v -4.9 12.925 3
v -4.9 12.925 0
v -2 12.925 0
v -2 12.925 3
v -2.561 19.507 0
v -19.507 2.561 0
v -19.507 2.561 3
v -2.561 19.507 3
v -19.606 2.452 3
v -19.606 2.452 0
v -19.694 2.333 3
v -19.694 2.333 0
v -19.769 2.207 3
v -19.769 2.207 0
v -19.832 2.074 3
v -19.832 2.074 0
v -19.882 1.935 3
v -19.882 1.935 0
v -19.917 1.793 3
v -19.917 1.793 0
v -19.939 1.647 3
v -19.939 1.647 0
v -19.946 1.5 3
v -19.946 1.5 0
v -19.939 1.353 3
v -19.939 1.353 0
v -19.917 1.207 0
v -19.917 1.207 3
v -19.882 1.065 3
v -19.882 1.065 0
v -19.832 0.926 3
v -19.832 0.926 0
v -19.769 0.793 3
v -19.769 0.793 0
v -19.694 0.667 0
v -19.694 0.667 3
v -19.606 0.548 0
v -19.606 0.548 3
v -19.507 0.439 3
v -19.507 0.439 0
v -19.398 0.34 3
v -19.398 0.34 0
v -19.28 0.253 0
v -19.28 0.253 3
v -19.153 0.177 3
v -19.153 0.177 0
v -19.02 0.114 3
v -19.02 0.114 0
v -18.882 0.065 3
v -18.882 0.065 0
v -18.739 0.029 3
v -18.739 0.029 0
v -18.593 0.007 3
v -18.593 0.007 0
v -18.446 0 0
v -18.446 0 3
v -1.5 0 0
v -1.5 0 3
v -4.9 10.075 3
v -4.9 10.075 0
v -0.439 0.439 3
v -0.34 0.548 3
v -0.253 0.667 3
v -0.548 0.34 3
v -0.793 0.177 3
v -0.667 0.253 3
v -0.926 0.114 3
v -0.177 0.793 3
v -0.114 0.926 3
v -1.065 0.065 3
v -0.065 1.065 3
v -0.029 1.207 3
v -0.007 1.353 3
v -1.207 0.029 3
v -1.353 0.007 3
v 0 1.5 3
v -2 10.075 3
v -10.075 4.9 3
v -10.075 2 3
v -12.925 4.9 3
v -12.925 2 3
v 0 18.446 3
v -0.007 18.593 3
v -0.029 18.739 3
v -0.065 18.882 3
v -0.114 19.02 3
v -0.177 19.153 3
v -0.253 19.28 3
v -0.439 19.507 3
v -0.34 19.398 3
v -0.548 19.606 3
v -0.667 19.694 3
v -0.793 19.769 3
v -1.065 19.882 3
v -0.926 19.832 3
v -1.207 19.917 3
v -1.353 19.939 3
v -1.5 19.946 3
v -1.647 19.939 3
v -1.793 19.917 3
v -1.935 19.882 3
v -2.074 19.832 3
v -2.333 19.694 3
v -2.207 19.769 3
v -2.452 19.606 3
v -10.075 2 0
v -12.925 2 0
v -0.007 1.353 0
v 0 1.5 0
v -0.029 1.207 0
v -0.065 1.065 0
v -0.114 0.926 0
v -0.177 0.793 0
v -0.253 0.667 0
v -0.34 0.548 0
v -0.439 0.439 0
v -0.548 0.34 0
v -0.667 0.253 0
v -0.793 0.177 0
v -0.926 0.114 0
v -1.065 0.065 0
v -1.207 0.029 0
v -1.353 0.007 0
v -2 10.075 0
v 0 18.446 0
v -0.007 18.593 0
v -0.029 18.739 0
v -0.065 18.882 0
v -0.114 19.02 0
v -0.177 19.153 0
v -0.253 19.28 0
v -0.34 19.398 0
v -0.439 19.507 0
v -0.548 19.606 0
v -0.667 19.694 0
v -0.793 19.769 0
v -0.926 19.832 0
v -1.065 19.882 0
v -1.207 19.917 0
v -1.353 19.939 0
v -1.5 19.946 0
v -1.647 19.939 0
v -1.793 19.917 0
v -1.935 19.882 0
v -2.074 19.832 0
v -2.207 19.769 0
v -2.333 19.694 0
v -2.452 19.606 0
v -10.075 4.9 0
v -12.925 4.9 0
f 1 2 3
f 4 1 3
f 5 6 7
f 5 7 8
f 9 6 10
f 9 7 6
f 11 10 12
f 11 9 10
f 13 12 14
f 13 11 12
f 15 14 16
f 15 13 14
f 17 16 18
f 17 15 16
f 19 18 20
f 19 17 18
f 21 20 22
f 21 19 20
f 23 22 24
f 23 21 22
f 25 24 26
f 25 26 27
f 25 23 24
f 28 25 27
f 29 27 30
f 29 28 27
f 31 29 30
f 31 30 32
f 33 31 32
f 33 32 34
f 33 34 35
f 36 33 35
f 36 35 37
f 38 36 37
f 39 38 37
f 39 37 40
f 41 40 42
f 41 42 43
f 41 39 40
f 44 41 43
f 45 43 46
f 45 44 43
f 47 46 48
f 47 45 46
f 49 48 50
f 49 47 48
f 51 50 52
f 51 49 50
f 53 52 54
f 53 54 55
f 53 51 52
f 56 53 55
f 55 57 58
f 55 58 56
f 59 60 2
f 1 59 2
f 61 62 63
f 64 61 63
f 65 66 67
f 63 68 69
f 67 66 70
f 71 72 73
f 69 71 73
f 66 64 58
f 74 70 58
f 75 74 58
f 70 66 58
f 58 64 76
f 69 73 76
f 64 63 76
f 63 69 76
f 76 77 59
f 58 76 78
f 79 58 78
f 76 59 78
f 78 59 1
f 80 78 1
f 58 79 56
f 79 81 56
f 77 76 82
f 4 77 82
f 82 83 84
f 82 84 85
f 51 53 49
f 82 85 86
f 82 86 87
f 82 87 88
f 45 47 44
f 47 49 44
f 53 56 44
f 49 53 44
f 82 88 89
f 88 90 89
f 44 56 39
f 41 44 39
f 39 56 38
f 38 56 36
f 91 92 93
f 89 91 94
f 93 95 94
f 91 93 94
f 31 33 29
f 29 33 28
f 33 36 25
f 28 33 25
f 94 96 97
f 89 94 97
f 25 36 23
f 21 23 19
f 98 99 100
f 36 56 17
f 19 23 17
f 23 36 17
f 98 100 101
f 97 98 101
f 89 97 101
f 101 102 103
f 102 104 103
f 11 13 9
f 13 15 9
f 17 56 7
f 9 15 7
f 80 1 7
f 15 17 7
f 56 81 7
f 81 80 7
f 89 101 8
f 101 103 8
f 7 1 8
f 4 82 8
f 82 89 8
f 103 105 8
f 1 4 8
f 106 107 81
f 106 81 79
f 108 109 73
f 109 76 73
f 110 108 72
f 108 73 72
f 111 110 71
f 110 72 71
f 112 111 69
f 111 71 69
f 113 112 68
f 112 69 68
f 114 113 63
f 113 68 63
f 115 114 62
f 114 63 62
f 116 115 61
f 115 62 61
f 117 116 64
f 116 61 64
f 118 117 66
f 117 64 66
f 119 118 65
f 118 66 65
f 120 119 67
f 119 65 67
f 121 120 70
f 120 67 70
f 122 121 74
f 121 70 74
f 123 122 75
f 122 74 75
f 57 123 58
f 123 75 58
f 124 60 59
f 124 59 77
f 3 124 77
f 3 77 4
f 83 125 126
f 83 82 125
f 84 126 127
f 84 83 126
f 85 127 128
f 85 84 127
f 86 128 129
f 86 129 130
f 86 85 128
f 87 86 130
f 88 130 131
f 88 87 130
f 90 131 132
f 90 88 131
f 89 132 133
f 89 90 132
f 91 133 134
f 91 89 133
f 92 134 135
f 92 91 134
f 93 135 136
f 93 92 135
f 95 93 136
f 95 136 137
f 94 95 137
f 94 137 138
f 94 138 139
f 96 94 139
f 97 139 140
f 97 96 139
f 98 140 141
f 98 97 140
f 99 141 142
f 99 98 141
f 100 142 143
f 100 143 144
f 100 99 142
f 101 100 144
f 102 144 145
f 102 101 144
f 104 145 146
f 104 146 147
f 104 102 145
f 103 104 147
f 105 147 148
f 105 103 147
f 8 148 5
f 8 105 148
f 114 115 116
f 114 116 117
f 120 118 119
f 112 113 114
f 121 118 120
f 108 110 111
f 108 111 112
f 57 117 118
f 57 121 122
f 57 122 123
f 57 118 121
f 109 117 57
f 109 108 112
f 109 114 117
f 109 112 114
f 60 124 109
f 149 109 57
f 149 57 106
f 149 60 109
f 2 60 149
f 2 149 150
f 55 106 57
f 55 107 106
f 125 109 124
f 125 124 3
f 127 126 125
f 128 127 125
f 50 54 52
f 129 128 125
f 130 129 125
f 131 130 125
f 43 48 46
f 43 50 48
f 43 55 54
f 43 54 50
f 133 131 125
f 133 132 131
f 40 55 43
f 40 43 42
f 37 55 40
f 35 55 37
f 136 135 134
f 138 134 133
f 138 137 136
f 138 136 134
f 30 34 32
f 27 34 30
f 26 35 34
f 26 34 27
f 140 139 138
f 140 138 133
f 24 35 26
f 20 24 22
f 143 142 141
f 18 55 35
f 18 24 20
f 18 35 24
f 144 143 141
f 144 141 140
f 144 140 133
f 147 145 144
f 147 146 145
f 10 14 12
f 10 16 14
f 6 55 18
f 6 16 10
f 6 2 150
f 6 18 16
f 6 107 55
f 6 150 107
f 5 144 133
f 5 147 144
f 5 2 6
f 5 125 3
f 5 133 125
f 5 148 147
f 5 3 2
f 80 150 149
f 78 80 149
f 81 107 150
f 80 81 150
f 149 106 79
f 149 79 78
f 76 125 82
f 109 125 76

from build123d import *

# Parameters (mm, degrees)
SKETCH_1_W      = 2.85
SKETCH_1_H      = 2.9
SKETCH_1_W_2    = 2.9
SKETCH_1_H_2    = 2.85
EXTRUDE_1_DEPTH = 3
FILLET_1_R      = 1.5


with BuildPart() as part:
    # Эскиз1 → Бобышка-Вытянуть1 (new body)
    with BuildSketch(Plane.XY):
        Polygon((0, 22.067640687), (0, 0), (-22.067640687, 0), align=None)
        with Locations((-11.5, 3.45)):
            Rectangle(SKETCH_1_W, SKETCH_1_H, mode=Mode.SUBTRACT)
        with Locations((-3.45, 11.5)):
            Rectangle(SKETCH_1_W_2, SKETCH_1_H_2, mode=Mode.SUBTRACT)
    extrude(amount=EXTRUDE_1_DEPTH)

    # Скругление1
    fillet_1_edges = [part.edges().sort_by_distance(p)[0] for p in [
        (0, 0, 1.5),
        (-22.067640687, 0, 1.5),
        (0, 22.067640687, 1.5),
    ]]
    fillet(fillet_1_edges, radius=FILLET_1_R)


solid = part.part
